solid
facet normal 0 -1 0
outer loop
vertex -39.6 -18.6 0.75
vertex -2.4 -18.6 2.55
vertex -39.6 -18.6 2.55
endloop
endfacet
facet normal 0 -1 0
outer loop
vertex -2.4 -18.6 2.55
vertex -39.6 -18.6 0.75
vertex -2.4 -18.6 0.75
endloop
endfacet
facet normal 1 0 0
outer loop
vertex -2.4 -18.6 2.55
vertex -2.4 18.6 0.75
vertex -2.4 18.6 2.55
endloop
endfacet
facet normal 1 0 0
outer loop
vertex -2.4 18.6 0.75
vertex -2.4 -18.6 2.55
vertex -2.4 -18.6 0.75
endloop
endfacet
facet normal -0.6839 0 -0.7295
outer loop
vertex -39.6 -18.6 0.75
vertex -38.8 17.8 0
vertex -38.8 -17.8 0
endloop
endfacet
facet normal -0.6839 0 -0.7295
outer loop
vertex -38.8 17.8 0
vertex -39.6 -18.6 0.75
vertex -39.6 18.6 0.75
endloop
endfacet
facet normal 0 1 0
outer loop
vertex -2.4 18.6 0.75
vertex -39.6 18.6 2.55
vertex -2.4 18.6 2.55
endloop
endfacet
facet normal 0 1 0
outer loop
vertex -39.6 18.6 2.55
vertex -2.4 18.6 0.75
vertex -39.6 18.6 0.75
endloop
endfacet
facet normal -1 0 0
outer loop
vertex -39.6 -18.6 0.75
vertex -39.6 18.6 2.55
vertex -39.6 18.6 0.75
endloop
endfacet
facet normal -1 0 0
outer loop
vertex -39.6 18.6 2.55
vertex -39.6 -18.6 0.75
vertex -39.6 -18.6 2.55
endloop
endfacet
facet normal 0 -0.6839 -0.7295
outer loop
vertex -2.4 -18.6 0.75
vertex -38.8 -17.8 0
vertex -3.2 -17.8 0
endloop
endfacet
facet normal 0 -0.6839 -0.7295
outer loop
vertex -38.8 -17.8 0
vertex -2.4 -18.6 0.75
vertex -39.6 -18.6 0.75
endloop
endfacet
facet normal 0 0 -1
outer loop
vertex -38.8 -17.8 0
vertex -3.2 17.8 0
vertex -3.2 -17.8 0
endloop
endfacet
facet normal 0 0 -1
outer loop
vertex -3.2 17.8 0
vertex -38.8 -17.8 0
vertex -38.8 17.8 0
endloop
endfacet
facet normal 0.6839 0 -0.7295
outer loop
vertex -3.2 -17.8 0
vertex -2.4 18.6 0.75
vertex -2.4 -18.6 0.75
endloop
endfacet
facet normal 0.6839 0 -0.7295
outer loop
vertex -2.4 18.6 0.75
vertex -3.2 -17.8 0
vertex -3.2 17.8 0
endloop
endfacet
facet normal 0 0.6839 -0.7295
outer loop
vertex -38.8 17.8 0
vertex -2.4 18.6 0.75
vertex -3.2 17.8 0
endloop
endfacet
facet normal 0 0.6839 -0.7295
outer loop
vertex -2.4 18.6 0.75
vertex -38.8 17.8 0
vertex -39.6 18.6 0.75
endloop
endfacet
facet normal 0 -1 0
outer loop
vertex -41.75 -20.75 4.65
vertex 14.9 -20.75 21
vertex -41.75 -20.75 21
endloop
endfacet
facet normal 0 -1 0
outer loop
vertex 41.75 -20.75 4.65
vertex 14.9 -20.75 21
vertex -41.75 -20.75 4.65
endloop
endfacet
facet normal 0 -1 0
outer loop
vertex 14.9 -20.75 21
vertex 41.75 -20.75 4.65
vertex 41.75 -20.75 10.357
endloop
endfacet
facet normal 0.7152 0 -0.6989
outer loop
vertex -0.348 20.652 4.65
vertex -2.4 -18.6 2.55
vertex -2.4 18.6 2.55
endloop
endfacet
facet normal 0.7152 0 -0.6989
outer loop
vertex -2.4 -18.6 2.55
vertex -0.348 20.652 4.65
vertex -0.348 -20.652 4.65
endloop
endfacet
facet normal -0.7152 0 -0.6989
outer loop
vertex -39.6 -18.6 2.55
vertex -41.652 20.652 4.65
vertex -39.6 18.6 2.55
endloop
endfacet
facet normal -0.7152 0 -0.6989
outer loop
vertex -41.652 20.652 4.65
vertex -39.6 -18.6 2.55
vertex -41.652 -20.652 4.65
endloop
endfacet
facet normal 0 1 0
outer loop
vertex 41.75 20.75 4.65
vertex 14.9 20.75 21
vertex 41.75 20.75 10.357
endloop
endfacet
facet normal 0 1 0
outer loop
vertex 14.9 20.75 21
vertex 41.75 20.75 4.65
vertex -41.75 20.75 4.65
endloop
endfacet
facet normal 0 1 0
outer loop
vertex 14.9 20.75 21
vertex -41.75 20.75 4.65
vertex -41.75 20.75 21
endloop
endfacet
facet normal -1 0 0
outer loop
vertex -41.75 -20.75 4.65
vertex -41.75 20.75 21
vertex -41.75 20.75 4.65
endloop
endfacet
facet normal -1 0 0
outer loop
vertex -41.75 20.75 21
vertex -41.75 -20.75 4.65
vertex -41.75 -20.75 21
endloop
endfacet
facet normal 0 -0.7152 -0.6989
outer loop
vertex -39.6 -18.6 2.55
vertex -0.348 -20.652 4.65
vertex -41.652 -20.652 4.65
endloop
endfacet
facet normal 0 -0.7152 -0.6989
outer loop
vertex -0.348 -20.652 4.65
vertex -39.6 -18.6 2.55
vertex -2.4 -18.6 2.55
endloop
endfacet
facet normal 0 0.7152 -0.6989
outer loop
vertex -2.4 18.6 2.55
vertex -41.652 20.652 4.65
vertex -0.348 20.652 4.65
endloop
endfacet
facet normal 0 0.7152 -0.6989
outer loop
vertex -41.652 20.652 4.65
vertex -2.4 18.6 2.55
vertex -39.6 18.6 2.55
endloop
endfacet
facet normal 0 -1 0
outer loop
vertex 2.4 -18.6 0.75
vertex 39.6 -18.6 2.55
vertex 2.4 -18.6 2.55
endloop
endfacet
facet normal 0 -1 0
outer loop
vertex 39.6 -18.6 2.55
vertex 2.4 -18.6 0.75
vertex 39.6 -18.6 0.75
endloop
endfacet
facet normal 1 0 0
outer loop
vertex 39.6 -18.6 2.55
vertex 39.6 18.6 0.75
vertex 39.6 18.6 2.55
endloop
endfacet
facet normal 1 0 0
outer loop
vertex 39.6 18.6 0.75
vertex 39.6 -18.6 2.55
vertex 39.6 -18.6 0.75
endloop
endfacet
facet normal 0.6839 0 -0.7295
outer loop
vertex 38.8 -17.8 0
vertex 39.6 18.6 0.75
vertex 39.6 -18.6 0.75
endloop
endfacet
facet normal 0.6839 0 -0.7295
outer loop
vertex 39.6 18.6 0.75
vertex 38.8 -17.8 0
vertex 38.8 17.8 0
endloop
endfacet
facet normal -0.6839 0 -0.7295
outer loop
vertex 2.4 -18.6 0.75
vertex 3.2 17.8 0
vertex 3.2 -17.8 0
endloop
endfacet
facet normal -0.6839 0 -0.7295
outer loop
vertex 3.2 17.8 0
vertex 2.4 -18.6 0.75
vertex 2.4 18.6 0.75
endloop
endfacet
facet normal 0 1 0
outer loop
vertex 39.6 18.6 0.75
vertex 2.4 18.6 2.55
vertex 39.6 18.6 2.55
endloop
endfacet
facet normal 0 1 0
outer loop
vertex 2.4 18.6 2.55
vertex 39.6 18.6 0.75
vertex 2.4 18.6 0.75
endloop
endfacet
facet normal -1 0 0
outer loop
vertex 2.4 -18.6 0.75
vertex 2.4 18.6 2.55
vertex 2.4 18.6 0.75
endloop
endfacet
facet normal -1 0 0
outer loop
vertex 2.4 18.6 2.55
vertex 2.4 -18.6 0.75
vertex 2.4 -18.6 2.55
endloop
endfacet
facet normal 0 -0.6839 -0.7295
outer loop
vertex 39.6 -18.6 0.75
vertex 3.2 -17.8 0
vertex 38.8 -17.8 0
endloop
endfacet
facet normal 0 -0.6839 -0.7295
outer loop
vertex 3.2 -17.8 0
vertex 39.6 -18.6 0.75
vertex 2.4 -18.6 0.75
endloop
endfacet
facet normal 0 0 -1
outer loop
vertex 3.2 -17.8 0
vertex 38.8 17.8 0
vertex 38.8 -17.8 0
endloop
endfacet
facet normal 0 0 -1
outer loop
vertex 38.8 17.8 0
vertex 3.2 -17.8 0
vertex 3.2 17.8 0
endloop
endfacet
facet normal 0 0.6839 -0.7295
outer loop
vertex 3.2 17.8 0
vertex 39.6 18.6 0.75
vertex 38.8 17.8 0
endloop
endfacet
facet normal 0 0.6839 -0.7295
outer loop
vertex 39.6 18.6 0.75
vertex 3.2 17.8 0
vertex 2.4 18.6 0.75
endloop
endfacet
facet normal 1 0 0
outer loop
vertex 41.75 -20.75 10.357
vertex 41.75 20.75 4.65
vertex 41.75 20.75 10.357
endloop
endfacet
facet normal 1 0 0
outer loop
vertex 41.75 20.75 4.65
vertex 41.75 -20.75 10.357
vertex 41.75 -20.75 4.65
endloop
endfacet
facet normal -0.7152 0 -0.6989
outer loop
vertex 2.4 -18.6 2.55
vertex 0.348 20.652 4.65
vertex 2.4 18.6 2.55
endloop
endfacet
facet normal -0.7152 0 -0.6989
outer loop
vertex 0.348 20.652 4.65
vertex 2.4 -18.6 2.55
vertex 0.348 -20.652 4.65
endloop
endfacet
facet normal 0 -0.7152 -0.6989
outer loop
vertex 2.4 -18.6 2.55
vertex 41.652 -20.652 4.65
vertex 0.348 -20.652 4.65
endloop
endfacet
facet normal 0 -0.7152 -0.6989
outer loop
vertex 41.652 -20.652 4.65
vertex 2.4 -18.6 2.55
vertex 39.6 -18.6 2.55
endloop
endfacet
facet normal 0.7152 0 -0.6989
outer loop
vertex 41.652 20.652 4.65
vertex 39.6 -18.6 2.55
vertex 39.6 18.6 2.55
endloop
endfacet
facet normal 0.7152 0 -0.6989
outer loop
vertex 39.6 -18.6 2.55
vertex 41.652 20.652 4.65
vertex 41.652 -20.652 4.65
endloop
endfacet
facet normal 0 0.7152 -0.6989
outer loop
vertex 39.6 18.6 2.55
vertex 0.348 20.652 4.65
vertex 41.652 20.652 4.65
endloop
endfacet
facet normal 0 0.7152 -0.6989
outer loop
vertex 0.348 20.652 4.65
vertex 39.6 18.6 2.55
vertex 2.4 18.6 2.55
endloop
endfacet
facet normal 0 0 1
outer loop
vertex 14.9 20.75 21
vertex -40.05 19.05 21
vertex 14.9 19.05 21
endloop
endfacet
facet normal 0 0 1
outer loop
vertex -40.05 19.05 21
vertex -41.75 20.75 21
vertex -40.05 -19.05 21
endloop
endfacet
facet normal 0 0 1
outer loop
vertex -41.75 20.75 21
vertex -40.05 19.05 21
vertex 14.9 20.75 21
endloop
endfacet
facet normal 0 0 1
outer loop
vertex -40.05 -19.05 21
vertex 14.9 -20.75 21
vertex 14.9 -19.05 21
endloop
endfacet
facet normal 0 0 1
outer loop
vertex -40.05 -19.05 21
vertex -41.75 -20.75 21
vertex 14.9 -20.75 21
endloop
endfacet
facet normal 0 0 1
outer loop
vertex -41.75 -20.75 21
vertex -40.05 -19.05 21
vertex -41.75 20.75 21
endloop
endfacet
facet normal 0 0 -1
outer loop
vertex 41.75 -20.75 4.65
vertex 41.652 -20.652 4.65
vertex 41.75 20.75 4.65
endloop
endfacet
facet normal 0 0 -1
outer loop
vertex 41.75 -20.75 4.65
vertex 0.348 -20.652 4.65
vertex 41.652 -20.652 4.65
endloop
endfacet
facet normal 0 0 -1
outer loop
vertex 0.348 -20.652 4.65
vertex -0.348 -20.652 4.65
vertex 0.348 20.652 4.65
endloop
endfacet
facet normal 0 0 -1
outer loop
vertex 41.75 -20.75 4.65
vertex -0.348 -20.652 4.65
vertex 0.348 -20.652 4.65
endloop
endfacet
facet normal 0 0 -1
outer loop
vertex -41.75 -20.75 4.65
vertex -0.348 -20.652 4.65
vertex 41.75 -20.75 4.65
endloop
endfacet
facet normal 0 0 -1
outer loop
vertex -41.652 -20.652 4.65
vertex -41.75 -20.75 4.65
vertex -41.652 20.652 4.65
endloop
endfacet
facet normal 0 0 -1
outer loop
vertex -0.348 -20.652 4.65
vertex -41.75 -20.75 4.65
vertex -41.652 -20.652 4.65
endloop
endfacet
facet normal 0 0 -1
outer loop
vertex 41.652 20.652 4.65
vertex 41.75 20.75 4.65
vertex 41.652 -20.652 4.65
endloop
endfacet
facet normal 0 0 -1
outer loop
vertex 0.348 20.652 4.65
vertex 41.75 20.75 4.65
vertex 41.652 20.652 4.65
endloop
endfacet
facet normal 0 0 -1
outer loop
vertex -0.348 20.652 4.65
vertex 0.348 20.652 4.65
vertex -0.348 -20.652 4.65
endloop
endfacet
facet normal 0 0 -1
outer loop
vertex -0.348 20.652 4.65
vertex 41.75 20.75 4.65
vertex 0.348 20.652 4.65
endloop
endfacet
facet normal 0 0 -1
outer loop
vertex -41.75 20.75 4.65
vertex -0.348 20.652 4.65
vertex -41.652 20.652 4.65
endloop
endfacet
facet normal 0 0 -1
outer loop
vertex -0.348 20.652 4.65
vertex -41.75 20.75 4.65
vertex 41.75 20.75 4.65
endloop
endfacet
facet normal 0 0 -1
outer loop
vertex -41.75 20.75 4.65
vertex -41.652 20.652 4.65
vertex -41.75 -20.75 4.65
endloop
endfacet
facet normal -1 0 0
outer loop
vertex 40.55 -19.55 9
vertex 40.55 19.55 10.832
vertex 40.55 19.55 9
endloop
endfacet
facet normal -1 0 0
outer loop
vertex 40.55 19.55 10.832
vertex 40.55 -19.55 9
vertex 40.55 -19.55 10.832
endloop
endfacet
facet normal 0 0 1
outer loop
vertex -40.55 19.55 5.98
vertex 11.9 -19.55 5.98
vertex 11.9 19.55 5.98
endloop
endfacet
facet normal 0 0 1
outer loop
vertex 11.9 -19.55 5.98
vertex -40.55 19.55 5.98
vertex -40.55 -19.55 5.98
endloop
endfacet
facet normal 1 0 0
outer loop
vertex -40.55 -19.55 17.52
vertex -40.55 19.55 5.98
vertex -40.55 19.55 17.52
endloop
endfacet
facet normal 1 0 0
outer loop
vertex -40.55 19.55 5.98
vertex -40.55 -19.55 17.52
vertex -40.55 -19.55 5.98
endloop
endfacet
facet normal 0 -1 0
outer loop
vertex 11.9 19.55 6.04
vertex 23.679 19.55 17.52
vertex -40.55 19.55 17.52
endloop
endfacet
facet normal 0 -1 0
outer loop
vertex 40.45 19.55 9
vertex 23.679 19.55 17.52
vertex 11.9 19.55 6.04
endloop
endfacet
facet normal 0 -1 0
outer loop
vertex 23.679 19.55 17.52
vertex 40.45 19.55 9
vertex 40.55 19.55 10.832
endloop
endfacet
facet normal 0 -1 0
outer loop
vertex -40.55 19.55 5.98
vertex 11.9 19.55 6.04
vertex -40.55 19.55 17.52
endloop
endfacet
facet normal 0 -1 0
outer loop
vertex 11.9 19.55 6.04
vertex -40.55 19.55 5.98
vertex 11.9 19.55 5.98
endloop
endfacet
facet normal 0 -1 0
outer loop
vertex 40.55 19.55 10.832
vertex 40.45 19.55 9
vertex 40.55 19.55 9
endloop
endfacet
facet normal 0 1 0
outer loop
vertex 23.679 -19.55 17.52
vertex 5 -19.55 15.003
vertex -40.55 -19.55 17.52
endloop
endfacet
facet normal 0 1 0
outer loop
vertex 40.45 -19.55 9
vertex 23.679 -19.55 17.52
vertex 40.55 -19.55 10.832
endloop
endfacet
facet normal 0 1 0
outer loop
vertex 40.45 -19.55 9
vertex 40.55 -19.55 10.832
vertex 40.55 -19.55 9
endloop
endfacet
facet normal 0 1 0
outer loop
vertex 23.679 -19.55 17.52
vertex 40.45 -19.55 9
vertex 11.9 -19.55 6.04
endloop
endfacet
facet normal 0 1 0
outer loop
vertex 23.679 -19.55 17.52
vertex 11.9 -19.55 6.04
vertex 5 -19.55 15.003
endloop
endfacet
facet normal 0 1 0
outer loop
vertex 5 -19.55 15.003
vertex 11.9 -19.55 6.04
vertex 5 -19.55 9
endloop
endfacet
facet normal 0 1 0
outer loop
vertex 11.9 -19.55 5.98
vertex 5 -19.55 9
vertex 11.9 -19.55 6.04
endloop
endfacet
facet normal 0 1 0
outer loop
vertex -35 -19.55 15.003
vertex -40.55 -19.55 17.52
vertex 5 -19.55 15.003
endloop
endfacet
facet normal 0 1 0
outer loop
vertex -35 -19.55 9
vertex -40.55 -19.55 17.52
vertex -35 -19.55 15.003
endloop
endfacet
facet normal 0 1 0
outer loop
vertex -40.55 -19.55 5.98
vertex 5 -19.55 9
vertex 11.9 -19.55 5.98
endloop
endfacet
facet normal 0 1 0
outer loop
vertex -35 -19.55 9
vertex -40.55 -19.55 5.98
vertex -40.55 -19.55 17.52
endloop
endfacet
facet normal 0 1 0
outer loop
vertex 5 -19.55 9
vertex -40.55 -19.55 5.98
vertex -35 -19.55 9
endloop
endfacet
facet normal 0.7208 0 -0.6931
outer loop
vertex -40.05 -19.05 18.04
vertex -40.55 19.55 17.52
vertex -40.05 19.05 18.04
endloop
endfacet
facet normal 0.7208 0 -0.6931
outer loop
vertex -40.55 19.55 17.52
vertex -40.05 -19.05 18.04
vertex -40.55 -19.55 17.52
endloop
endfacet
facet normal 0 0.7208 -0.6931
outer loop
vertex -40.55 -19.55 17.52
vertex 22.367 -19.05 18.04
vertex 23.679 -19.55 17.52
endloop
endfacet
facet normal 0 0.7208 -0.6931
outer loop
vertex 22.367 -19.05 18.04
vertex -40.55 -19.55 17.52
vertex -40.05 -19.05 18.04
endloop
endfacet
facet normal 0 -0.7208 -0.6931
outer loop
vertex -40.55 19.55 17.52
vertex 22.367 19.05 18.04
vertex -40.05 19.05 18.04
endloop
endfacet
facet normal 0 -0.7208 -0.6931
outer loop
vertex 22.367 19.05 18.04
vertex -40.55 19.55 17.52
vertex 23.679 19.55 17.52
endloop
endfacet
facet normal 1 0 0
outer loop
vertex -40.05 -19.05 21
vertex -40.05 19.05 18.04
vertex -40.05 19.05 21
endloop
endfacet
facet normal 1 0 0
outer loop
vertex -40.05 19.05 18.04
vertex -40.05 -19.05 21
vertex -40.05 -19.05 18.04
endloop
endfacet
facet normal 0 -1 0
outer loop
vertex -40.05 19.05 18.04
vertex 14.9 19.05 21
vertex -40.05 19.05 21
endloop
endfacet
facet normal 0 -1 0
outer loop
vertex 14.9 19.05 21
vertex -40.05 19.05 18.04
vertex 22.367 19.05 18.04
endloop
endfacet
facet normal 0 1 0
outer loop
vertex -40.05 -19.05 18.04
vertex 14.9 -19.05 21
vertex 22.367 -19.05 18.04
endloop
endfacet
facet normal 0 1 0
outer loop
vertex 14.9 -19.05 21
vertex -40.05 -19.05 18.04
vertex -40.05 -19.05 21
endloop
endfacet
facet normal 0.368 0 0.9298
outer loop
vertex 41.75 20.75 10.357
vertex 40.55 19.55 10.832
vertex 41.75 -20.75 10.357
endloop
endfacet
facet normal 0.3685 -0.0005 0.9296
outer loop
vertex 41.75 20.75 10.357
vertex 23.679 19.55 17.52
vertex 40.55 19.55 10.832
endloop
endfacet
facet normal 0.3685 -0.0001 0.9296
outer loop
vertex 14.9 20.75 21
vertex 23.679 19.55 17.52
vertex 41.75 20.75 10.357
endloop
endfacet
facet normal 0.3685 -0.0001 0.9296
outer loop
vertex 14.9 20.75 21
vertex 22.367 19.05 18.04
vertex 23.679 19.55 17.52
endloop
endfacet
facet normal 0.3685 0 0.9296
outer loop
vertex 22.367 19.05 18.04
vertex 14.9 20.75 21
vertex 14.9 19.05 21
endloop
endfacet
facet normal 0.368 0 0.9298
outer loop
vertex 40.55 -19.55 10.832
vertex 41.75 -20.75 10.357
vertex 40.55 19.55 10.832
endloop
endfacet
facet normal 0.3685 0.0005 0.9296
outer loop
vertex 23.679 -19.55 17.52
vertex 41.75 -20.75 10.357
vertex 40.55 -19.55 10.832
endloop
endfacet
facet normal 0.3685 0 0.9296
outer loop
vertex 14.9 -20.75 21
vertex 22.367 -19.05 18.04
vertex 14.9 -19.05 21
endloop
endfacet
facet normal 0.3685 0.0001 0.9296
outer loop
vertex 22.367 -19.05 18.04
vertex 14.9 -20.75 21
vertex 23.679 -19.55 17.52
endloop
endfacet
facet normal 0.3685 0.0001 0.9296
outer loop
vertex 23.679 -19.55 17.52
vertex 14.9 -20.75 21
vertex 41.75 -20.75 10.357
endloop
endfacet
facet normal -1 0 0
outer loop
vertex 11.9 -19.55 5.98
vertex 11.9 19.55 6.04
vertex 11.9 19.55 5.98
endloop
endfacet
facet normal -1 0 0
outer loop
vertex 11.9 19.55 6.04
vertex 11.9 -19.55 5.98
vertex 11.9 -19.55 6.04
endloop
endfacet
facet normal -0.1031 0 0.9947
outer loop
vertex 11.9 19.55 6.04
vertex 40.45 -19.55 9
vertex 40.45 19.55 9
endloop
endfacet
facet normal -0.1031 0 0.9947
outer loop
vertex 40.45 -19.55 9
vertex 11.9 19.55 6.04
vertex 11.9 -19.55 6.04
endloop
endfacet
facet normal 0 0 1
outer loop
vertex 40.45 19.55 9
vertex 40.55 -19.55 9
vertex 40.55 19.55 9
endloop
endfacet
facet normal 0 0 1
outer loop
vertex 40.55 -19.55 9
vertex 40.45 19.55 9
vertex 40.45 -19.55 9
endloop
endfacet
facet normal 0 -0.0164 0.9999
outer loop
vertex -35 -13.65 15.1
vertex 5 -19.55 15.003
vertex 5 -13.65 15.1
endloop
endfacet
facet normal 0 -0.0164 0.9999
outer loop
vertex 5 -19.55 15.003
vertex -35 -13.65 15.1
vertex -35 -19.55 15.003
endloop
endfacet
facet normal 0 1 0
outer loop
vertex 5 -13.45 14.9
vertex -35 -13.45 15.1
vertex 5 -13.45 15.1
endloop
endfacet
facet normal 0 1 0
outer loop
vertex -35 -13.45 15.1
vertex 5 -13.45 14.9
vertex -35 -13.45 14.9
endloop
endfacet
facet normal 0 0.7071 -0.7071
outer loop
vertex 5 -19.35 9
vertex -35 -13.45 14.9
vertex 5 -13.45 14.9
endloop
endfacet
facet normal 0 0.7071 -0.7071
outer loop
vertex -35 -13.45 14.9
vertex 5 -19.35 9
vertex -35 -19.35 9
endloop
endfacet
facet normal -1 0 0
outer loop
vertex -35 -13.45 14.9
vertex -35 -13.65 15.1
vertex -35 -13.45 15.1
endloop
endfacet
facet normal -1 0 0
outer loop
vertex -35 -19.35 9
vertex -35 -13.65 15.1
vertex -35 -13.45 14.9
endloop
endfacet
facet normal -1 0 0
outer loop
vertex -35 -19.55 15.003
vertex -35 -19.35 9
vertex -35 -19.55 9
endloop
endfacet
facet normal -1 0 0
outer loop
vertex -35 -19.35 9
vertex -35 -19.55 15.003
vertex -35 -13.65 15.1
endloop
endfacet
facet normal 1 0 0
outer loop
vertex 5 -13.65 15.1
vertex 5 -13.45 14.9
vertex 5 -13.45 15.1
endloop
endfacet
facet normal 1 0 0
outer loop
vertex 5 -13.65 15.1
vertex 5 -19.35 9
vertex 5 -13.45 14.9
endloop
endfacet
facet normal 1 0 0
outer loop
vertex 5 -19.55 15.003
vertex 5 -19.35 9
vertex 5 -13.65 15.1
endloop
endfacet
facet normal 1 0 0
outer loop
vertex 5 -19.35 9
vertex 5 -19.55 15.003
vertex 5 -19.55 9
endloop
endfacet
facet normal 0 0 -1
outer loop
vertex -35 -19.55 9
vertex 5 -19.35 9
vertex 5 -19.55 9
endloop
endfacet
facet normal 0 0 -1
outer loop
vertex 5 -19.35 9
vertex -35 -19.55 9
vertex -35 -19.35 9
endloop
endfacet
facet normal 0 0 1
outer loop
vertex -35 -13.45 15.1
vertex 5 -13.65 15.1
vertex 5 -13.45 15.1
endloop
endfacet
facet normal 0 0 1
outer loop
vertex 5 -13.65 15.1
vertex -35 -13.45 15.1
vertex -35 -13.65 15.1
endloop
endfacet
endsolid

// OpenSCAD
// Gridfinity bin 2x1 x 3U tall
// Outside 83.5 x 41.5, H=21, foot 0.8/1.8/2.15, stacking lip, label shelf, scoop
grid = 42;
clr = 0.5;
Lx = 2*grid - clr; // 83.5
Ly = 1*grid - clr; // 41.5
H = 3*7; // 21
h1 = 0.8;
h2 = 1.8;
h3 = 2.15;
Hfoot = h1+h2+h3; // 4.75
foot_bot = Ly - 2*(h1+h3); // 35.6
foot_mid = foot_bot + 2*h1; // 37.2
wt = 1.2;
lipExtra = 0.5;
floorTop = 6.0;
lipTrans0 = 17.5;
lipTop0 = 18.0;
frontTop = 10;
x0 = 15;
xr0 = 12;
rampTop = 9;
shelfLen = 40;
shelfCx = -15; // shelf x in [-35,5]
shelf_y_wall = -(Ly/2 - wt); // -19.55
shelf_y_tip = shelf_y_wall + 6; // -13.55
shelf_z_bot = 9;
shelf_z_top = 15;
x1f = -grid/2;
x2f = grid/2;

echo(cadverify_spec = [
    ["bounds", [[-Lx/2, -Ly/2, 0], [Lx/2, Ly/2, H]]],
    ["bodies", 1],
    ["through_holes", 0],
    ["support_faces", [["bed", "-z", 2000]]],
    ["overhangs_allowed", []],
    ["copies", 1],
    ["details", [
        ["foot_left", "material", [[x1f-foot_bot/2, -foot_bot/2, 0.05], [x1f+foot_bot/2, foot_bot/2, 0.55]], 0.9],
        ["foot_right", "material", [[x2f-foot_bot/2, -foot_bot/2, 0.05], [x2f+foot_bot/2, foot_bot/2, 0.55]], 0.9],
        ["lip_back", "material", [[-30, Ly/2-wt-lipExtra, 19], [0, Ly/2, 21]], 0.9],
        ["label_shelf", "material", [[-30, -19, 14.5], [0, -14.5, 15]], 0.9],
        ["scoop_void", "void", [[30, -15, 10.5], [40.4, 15, 14]], 0.9],
        ["cavity", "void", [[-20, -10, 10], [10, 10, 16]], 0.9],
        ["wall", "thickness", [0, 25, 15], [0, -1, 0], 1.2],
        ["floor", "thickness", [-21, 0, -5], [0, 0, 1], 6.0]
    ]]
]);

module foot(cx) {
    hull() {
        translate([cx-foot_bot/2, -foot_bot/2, 0]) cube([foot_bot, foot_bot, 0.1]);
        translate([cx-foot_mid/2, -foot_mid/2, h1-0.05]) cube([foot_mid, foot_mid, 0.1]);
    }
    translate([cx-foot_mid/2, -foot_mid/2, h1-0.05]) cube([foot_mid, foot_mid, h2+0.1]);
    hull() {
        translate([cx-foot_mid/2, -foot_mid/2, h1+h2-0.05]) cube([foot_mid, foot_mid, 0.1]);
        translate([cx-Ly/2, -Ly/2, Hfoot]) cube([Ly, Ly, 0.1]);
    }
}

module body_outer() {
    foot(x1f);
    foot(x2f);
    translate([-Lx/2, -Ly/2, Hfoot-0.1]) cube([Lx, Ly, H-Hfoot+0.1]);
}

module cavity_solid() {
    intL_low = Lx-2*wt;
    intW_low = Ly-2*wt;
    intL_up = Lx-2*(wt+lipExtra);
    intW_up = Ly-2*(wt+lipExtra);
    translate([-intL_low/2, -intW_low/2, floorTop-0.02]) cube([intL_low, intW_low, (lipTrans0-floorTop)+0.02]);
    hull() {
        translate([-intL_low/2, -intW_low/2, lipTrans0-0.02]) cube([intL_low, intW_low, 0.04]);
        translate([-intL_up/2, -intW_up/2, lipTop0]) cube([intL_up, intW_up, 0.04]);
    }
    translate([-intL_up/2, -intW_up/2, lipTop0-0.02]) cube([intL_up, intW_up, (H+2-lipTop0)+0.02]);
}

module scoop_cut() {
    W = Ly+2;
    x1cut = Lx/2+1;
    hull() {
        translate([x0-0.1, -W/2, H]) cube([0.2, W, 2]);
        translate([x1cut-0.1, -W/2, frontTop]) cube([0.2, W, (H+2-frontTop)]);
    }
}

module scoop_ramp() {
    intW = Ly-2*wt;
    xr1 = Lx/2-wt;
    hull() {
        translate([xr0-0.1, -intW/2, floorTop-0.1]) cube([0.2, intW, 0.14]);
        translate([xr1-0.1, -intW/2, floorTop-0.1]) cube([0.2, intW, (rampTop-floorTop)+0.1]);
    }
}

module label_shelf_mod() {
    hull() {
        translate([shelfCx-shelfLen/2, shelf_y_wall-0.2, shelf_z_bot]) cube([shelfLen, 0.4, shelf_z_top-shelf_z_bot]);
        translate([shelfCx-shelfLen/2, shelf_y_tip-0.1, shelf_z_top-0.1]) cube([shelfLen, 0.2, 0.2]);
    }
}

module bin_part() {
    difference() {
        body_outer();
        cavity_solid();
        scoop_cut();
    }
}

union() {
    bin_part();
    scoop_ramp();
    label_shelf_mod();
}
